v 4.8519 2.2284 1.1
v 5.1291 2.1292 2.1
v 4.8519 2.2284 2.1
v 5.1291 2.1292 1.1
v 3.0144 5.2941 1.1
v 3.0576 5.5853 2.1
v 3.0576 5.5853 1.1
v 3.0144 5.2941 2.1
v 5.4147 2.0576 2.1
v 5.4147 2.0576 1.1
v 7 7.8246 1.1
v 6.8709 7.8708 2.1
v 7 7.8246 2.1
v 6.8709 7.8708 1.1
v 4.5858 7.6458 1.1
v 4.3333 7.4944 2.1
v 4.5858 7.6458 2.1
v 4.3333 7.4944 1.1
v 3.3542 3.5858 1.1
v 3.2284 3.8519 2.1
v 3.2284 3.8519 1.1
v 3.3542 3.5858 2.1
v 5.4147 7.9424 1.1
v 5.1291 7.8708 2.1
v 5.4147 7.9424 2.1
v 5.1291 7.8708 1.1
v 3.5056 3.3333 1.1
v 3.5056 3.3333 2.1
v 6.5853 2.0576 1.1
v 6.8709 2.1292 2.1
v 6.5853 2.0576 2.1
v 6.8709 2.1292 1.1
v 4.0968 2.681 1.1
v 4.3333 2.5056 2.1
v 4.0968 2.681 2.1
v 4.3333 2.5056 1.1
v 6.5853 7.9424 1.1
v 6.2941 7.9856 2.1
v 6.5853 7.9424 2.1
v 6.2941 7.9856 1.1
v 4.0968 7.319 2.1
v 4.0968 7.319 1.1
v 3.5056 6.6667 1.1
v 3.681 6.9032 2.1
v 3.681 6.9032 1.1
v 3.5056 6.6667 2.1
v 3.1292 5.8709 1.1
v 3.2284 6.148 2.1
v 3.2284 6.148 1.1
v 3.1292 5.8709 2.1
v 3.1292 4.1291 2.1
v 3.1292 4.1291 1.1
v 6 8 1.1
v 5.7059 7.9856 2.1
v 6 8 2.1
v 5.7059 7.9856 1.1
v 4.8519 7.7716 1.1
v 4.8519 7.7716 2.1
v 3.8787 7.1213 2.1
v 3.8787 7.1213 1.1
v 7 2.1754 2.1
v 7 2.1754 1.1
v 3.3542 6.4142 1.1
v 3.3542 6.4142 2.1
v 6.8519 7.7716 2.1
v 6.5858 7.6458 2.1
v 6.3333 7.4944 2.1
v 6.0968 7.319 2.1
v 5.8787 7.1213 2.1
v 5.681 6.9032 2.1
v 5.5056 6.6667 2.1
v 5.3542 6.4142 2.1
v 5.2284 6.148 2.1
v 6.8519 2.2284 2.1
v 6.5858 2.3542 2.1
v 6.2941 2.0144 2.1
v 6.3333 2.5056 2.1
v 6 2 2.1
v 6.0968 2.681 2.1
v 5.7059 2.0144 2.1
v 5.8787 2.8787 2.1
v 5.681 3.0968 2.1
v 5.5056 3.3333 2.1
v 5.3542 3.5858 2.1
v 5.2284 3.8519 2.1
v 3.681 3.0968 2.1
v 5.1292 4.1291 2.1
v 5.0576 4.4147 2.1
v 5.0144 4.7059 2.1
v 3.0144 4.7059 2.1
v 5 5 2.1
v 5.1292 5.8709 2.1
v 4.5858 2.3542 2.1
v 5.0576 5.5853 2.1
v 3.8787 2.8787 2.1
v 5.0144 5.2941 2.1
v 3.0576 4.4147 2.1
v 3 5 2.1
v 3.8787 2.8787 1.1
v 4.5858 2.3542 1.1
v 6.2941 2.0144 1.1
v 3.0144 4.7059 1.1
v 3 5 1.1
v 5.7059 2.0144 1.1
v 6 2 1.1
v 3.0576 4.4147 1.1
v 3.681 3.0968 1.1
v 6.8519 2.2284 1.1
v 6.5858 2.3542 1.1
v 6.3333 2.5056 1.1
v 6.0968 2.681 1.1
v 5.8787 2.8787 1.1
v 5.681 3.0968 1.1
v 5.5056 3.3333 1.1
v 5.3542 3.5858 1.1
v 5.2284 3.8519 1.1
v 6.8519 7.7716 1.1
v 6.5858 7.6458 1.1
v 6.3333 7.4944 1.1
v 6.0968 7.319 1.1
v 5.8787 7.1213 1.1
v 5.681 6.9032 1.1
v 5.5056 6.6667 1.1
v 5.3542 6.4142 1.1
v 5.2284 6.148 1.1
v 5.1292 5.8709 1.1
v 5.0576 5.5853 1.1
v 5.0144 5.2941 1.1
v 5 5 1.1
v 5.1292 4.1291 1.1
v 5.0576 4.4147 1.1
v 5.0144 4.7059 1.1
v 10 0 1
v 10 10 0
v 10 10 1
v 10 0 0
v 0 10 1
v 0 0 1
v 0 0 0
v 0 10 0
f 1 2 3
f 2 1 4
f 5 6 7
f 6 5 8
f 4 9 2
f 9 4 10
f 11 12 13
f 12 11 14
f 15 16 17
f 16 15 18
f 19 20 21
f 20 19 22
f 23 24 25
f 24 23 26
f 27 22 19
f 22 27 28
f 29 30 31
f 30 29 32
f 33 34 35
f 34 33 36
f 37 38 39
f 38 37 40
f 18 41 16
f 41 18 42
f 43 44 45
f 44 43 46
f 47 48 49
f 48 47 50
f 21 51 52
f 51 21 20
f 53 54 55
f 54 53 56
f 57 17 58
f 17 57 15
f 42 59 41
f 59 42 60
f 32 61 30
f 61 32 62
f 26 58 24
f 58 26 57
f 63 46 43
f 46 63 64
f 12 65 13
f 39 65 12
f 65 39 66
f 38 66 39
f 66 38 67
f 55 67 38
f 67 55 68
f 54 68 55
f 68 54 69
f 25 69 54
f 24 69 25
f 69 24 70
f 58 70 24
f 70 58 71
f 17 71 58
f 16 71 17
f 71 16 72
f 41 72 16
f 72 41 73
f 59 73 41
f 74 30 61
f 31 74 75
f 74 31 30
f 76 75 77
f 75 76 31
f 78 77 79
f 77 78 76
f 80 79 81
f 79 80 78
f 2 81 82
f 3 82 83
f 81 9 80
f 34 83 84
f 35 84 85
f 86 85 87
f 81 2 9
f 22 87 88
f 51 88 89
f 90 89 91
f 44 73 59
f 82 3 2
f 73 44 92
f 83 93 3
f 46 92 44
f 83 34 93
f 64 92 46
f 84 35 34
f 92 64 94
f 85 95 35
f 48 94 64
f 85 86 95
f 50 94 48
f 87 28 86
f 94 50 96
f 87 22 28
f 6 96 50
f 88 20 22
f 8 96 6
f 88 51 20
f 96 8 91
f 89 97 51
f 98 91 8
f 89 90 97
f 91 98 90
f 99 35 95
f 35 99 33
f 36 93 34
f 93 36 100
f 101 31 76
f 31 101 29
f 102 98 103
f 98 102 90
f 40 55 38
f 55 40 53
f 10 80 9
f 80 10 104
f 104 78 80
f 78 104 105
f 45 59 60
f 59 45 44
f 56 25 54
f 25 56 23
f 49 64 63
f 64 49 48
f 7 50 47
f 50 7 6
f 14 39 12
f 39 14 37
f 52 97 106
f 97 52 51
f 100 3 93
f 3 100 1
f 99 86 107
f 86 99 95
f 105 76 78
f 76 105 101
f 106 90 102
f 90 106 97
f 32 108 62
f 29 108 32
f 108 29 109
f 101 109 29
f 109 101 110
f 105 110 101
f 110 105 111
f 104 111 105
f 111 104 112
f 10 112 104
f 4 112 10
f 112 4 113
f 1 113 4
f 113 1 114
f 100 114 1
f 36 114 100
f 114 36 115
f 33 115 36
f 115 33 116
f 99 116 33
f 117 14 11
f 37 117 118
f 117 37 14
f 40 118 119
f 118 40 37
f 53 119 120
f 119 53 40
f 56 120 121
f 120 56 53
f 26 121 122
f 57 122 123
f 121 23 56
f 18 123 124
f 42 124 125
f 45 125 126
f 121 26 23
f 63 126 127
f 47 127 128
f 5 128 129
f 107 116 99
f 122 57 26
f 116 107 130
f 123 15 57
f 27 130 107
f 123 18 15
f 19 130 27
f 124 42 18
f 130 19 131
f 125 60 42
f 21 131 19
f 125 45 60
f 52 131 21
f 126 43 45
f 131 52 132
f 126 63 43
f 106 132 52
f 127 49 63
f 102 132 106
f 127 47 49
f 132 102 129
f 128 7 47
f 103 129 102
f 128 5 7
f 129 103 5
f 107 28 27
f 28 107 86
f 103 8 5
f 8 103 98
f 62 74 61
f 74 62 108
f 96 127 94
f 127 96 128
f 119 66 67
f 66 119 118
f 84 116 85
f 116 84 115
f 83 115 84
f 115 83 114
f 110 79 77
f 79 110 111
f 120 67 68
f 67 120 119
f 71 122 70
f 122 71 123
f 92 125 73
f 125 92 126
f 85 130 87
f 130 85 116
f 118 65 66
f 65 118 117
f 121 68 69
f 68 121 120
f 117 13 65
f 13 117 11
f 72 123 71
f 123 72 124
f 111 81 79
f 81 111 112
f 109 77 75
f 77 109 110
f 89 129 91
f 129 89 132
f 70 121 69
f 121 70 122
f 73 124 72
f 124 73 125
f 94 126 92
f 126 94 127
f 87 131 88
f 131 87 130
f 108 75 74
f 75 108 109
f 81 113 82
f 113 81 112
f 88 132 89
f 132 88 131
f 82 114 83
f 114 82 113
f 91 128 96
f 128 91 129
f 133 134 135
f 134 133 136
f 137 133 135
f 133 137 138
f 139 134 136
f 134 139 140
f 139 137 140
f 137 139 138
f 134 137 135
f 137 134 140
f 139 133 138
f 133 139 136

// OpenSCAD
$fn=64;
color("green")
cube([10,10,1]);

difference(){
    translate([6,5,1.1])
    cylinder(h=1, r=3);

    //color("blue")
    translate([8,5,1.0])
    cylinder(h=2, r=3);
}
